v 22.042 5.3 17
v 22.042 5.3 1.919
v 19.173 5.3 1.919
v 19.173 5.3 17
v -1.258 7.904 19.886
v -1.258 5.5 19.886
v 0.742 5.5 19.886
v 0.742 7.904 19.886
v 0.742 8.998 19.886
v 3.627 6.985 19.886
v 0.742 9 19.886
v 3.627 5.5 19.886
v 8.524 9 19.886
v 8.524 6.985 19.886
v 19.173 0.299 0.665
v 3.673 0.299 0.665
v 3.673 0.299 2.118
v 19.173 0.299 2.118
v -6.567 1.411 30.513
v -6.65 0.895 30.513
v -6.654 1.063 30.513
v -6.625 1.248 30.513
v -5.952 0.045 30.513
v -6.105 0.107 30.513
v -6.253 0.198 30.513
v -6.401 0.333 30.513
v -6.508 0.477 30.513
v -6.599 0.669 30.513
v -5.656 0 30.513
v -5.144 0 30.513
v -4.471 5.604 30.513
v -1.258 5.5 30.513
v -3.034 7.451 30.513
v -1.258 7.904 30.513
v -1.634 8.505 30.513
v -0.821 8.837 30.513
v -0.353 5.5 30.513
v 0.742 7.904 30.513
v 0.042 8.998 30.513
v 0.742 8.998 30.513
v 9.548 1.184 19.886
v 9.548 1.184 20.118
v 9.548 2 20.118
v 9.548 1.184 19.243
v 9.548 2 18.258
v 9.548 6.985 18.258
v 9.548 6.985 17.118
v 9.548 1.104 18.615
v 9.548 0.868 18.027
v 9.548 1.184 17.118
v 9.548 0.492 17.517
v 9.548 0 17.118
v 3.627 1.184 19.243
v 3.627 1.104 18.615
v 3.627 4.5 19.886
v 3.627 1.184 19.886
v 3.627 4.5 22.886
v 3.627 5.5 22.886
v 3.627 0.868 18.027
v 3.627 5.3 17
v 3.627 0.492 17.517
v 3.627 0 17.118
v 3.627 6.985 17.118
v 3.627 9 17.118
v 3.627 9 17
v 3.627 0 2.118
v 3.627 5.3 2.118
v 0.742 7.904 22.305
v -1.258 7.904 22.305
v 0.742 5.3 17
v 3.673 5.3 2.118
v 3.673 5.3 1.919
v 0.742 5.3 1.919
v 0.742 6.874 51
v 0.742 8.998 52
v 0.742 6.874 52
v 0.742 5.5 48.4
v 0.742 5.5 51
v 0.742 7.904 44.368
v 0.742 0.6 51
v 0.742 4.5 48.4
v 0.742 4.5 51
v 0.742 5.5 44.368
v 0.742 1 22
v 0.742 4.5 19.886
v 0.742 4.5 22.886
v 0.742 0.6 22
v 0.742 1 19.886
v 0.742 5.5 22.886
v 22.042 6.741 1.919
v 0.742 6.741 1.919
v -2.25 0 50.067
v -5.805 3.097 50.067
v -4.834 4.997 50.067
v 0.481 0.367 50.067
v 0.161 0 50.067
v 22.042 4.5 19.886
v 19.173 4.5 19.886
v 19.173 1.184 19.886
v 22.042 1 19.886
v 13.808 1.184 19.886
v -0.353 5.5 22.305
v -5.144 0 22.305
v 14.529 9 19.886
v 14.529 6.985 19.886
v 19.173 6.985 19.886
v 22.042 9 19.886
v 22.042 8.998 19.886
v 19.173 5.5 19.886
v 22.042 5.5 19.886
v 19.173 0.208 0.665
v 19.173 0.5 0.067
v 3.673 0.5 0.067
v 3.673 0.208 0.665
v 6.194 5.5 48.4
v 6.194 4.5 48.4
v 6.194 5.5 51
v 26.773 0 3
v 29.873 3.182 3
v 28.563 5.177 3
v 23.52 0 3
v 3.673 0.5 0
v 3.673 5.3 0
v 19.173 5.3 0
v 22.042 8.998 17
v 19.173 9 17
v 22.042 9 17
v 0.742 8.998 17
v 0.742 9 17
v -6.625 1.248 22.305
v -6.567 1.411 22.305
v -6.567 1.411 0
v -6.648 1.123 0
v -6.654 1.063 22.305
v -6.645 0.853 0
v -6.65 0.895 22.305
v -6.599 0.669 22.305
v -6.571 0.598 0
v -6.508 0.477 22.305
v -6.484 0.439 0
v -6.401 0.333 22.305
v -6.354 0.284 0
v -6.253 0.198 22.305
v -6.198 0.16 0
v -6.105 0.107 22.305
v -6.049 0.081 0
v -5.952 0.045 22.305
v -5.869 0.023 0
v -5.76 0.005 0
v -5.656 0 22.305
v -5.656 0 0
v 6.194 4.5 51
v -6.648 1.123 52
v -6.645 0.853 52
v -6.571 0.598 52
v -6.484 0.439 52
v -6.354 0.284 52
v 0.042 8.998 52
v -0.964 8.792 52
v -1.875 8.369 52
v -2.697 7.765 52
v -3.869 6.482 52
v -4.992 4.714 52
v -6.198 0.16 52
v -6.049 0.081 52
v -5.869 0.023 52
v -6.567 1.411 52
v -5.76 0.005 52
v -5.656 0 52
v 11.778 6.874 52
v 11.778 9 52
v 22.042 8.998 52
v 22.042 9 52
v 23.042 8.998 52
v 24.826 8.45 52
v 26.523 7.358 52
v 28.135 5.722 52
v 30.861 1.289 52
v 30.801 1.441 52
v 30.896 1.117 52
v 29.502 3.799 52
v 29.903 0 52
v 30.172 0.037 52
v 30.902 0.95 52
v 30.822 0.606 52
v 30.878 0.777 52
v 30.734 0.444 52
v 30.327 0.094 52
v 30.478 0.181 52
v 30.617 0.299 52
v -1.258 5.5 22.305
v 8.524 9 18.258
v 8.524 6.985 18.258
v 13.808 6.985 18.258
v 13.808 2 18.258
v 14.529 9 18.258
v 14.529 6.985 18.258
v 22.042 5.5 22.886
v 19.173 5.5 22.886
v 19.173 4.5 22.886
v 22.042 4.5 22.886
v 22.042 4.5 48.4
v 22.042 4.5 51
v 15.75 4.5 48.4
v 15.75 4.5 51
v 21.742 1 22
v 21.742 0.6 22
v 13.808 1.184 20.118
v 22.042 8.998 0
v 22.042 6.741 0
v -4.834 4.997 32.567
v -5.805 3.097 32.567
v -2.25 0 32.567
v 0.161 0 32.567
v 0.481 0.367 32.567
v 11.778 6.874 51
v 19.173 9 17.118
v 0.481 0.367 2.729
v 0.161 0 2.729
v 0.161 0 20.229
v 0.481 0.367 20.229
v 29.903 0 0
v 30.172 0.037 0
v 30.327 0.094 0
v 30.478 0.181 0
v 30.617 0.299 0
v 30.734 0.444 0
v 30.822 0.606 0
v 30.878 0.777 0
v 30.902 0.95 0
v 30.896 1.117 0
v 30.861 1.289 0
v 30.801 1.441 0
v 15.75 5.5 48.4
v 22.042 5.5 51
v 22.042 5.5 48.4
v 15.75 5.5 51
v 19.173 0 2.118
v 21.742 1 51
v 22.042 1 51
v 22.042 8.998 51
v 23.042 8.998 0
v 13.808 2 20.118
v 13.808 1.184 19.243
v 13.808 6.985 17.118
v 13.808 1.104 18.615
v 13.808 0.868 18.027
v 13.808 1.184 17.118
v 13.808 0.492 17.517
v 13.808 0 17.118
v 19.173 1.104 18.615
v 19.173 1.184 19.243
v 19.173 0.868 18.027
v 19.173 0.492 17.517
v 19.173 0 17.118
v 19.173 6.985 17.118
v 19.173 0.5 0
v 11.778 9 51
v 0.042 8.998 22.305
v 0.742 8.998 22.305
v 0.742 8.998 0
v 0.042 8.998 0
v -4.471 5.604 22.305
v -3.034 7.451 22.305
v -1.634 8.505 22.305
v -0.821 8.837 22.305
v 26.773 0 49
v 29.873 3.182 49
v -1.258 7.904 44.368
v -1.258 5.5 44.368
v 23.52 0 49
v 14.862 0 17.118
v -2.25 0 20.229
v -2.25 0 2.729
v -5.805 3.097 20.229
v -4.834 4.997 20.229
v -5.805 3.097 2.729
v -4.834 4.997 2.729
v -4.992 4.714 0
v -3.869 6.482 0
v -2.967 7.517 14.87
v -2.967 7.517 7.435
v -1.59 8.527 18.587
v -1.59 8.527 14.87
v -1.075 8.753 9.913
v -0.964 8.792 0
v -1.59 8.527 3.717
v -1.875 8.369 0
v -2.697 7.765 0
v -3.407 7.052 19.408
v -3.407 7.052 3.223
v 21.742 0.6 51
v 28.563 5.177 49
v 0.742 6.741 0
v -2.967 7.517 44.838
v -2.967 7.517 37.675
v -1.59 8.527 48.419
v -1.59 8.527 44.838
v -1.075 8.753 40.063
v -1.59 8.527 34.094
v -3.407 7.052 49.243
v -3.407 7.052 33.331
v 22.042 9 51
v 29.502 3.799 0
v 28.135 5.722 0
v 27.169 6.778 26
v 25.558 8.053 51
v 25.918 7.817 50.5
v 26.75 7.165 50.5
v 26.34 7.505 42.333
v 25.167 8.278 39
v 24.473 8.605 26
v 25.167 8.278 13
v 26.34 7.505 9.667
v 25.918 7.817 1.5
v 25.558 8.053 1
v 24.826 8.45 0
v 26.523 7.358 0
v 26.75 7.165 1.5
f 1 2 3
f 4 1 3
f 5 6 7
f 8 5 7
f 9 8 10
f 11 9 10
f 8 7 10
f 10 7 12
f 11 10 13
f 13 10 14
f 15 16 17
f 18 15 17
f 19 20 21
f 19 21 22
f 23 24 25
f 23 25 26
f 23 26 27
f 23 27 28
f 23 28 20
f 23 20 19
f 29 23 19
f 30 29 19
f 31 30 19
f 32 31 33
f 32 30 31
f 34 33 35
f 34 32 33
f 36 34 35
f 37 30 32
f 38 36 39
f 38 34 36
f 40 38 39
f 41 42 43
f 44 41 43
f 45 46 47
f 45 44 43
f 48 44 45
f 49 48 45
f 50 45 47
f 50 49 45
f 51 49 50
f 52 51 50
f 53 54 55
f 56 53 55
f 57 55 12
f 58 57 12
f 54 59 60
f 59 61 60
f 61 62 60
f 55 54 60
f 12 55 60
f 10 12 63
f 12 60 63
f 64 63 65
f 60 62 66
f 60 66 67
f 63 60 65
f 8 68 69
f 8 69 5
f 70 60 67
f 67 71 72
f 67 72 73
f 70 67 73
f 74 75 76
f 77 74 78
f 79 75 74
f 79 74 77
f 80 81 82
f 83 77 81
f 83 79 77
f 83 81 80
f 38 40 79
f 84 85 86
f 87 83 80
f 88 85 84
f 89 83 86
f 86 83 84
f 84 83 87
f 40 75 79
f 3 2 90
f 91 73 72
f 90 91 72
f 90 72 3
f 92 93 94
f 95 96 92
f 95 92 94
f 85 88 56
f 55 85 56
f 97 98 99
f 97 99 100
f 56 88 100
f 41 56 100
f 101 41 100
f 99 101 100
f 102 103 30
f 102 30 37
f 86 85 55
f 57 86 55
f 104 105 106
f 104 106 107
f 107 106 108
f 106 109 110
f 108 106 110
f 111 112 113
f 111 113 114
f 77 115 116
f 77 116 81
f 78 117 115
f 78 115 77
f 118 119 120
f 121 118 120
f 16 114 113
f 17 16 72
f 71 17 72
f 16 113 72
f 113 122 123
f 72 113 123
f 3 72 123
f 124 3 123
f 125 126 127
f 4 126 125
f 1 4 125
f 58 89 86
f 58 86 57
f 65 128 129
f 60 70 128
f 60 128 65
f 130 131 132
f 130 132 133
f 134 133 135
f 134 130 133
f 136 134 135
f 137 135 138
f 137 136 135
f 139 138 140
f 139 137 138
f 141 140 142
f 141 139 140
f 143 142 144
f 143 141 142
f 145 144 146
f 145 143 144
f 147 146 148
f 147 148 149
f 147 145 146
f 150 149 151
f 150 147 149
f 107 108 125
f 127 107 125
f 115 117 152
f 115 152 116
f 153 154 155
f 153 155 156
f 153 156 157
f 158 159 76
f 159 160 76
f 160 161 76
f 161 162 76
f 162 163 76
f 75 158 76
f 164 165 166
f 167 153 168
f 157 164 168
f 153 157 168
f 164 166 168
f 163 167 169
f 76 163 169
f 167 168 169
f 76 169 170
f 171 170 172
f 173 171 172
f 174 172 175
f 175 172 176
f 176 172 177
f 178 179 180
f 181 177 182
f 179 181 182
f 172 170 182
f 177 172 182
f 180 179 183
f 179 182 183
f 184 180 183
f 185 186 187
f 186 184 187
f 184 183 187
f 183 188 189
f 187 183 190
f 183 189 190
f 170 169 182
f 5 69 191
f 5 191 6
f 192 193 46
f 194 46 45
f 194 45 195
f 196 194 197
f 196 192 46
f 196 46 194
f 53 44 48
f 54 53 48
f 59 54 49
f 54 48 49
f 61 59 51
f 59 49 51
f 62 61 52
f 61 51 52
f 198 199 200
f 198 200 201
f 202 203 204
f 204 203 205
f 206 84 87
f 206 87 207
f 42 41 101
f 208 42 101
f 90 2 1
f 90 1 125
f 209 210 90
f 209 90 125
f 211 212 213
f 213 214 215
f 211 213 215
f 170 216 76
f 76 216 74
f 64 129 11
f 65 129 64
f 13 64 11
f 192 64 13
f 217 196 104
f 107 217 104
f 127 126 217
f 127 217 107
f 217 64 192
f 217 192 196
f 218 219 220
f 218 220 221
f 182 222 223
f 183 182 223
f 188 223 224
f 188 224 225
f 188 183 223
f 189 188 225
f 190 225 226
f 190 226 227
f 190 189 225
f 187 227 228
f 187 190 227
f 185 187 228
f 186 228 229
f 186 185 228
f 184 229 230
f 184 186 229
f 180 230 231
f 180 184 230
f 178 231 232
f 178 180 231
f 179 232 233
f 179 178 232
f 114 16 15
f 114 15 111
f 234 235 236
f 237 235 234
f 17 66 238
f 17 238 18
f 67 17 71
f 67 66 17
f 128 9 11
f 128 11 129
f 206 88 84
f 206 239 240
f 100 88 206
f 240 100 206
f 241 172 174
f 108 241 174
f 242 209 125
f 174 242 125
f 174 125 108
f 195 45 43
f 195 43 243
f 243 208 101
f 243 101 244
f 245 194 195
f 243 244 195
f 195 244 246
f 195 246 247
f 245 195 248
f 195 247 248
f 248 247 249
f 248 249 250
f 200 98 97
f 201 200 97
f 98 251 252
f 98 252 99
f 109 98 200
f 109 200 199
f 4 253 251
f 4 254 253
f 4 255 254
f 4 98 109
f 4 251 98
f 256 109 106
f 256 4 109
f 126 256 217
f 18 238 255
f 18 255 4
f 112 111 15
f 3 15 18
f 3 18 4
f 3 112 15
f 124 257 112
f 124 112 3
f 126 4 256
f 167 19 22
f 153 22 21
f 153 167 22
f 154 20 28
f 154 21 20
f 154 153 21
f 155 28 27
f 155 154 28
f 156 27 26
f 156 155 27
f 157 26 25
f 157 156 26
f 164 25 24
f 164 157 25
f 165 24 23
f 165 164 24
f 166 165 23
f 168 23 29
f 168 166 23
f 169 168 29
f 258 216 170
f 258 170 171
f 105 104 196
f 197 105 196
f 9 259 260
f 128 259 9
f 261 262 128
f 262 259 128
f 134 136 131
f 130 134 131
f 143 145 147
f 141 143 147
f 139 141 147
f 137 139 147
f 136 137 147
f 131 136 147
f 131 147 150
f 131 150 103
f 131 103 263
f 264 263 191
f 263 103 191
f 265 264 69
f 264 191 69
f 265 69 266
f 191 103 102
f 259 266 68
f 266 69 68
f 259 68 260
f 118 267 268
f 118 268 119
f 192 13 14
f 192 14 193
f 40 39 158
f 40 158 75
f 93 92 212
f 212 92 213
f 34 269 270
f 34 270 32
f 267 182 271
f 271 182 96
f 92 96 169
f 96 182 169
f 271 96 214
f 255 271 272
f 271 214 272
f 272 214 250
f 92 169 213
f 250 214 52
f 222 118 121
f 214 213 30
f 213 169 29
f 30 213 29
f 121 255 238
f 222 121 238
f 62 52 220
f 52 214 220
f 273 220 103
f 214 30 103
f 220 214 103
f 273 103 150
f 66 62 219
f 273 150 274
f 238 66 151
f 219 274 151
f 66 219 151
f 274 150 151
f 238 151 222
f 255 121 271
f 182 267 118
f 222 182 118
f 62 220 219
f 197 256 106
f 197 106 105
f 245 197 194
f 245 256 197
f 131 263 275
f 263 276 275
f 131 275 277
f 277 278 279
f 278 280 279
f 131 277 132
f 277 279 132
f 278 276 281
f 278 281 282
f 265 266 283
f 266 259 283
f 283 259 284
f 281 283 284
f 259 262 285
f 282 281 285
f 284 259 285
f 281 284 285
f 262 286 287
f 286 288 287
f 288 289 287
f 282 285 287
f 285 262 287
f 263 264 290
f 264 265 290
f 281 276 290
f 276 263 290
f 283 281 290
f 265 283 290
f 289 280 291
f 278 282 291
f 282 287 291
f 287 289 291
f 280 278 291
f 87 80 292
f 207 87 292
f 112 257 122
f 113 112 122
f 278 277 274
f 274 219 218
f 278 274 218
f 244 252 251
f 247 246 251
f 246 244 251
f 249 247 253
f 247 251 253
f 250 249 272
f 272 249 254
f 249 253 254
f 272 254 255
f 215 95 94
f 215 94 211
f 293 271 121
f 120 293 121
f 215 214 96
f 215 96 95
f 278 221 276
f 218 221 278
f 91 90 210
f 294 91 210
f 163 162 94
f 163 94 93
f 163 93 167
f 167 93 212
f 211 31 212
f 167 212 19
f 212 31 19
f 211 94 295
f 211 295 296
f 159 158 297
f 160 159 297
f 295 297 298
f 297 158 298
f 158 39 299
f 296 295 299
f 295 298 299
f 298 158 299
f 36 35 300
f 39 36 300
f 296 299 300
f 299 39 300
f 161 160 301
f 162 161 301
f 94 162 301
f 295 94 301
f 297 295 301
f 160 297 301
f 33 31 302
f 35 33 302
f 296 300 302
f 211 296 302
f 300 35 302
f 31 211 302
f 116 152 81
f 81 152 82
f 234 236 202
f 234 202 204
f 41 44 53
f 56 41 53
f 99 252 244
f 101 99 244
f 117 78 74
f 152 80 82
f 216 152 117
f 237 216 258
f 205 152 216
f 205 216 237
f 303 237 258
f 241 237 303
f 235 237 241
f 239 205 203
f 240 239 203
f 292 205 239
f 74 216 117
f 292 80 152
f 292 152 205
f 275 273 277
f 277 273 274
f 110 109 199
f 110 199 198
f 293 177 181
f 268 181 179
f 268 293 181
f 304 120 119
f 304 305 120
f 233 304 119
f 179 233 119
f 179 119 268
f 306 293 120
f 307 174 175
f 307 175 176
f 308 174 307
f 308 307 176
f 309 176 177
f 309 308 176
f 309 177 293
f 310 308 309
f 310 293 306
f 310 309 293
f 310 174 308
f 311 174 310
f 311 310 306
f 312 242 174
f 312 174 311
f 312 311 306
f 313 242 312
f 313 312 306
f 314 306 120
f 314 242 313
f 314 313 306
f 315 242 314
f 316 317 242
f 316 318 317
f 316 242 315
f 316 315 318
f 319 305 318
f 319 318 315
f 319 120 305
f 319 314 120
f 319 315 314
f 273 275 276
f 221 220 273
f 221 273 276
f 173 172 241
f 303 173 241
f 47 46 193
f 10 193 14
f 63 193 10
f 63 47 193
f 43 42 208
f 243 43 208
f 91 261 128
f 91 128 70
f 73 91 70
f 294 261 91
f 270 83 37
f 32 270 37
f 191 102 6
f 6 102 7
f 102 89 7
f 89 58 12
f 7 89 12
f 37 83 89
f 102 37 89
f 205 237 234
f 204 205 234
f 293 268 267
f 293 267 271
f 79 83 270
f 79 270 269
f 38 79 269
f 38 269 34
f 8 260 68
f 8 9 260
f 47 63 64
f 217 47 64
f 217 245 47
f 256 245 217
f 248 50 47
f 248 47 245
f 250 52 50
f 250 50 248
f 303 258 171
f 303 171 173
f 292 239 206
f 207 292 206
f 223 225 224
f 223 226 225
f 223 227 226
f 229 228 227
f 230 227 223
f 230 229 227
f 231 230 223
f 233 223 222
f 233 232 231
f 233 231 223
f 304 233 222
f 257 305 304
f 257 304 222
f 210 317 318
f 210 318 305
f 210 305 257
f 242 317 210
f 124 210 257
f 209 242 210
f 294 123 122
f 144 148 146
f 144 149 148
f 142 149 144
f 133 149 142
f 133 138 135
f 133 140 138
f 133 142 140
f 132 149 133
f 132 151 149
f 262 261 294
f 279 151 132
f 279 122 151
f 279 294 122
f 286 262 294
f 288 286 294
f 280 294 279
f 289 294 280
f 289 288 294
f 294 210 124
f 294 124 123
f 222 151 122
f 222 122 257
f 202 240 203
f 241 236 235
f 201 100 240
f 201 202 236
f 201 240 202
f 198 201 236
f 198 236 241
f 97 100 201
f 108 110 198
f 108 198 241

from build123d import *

# Parameters (mm, degrees)
BOSS_EXTRUDE2_DEPTH      = 52
FILLET2_R                = 1
CUT_EXTRUDE2_DEPTH       = 3
CUT_EXTRUDE2_DEPTH_BACK  = 6
SKETCH10_W               = 2.071027546
SKETCH10_H               = 17.5
SKETCH12_W               = 21
SKETCH12_H               = 29
BATTERY_DEPTH            = 0.4
SKETCH14_W               = 21.3
SKETCH14_H               = 1
BOSS_EXTRUDE4_DEPTH      = 7.999920354
FILLET5_R                = 1
SKETCH19_W               = 21.3
SKETCH19_H               = 1
BOSS_EXTRUDE5_DEPTH      = 2.6
SKETCH20_W               = 9.556221564
SKETCH20_H               = 2.6
CUT_EXTRUDE9_DEPTH       = 2.6
SKETCH21_W               = 21.3
SKETCH21_H               = 2.886084762
BOSS_EXTRUDE6_DEPTH      = 8
SKETCH23_W               = 24.481547991
SKETCH23_H               = 2.403526745
CUT_EXTRUDE10_DEPTH      = 2
SKETCH26_W               = 11.036128308
SKETCH26_H               = 2.126226966
CUT_EXTRUDE11_DEPTH      = 2
CUT_EXTRUDE12_DEPTH      = 2
CUT_EXTRUDE12_DEPTH_BACK = 11
SKETCH27_W               = 46
SKETCH27_H               = 2.33
CUT_EXTRUDE15_DEPTH      = 3
CUT_EXTRUDE15_DEPTH_BACK = 2
SKETCH30_W               = 16.027497941
SKETCH30_H               = 8.207966742
SKETCH32_W               = 21.3
SKETCH32_H               = 4.3
BOSS_EXTRUDE7_DEPTH      = 17
SKETCH33_W               = 15.5
SKETCH33_H               = 4.8
CUT_EXTRUDE16_DEPTH      = 17
CUT_EXTRUDE17_DEPTH      = 16
CUT_EXTRUDE17_DEPTH_BACK = 16
SKETCH34_W               = 15.546115034
SKETCH34_H               = 15
CHAMFER1_SIZE            = 2.050303842
CHAMFER1_SIZE_2          = 1
SKETCH36_W               = 1.919218309
SKETCH36_H               = 1.441495618
BOSS_EXTRUDE8_DEPTH      = 24
SKETCH37_W               = 15.546115034
SKETCH37_H               = 5.800639797
CUT_EXTRUDE18_DEPTH      = 3
SKETCH38_W               = 4.259754253
SKETCH38_H               = 3
BOSS_EXTRUDE9_DEPTH      = 7
FILLET6_R                = 2.5
BOSS_EXTRUDE10_DEPTH     = 18
SKETCH41_W               = 2.868853839
SKETCH41_H               = 1
SKETCH41_W_2             = 2.885031127
BOSS_EXTRUDE11_DEPTH     = 3
SKETCH42_W               = 6.004877842
SKETCH42_H               = 3.067097043
CUT_EXTRUDE19_DEPTH      = 7


with BuildPart() as part:
    # Sketch1 → Boss-Extrude2 (new body)
    with BuildSketch(Plane.XY):
        with BuildLine():
            Line((-4.570161627, 0), (-7.263800128, 0))
            add(Edge.make_bspline(
                [(0.042333709, 8.998333002), (-4.213116867, 8.648828695), (-5.985828681, 2.169241543), (-7.263800128, 0)],
                knots=[0, 0, 0, 0, 1, 1, 1, 1], degree=3))
            Line((0.042333709, 8.998333002), (0.742333709, 8.998333002))
            Line((0.742333709, 8.998333002), (0.742333709, 1))
            Line((0.742333709, 1), (22.042333709, 1))
            Line((22.042333709, 1), (22.042333709, 8.998333002))
            Line((22.042333709, 8.998333002), (23.042333709, 8.998333002))
            add(Edge.make_bspline(
                [(23.042333709, 8.998333002), (27.852391375, 8.27132168), (31.467788923, 0)],
                knots=[0, 0, 0, 1, 1, 1], degree=2))
            Line((31.467788923, 0), (26.875523276, 0))
            Line((26.875523276, 0), (22.86911945, 0))
            Line((22.86911945, 0), (0, 0))
            Line((0, 0), (-4.570161627, 0))
        make_face()
    extrude(amount=BOSS_EXTRUDE2_DEPTH)

    # Fillet2
    fillet2_edges = [part.edges().sort_by_distance(p)[0] for p in [
        (-7.263800128, 0, 26),
    ]]
    fillet(fillet2_edges, radius=FILLET2_R)

    # Sketch10 → Cut-Extrude2 (cut, two sides: drawn at the far end of the back side and taken through both)
    with BuildSketch(Plane(origin=(-4.432649633, 3.861619691, 0), x_dir=(0.6568701979277837, 0.7540036757697632, 0), z_dir=(-0.7540036757697632, 0.6568701979277837, 0)).offset(-CUT_EXTRUDE2_DEPTH_BACK)):
        with Locations((-0.442686988, -41.317163409)):
            Rectangle(SKETCH10_W, SKETCH10_H)
        with Locations((-0.442686988, -11.478878468)):
            Rectangle(SKETCH10_W, SKETCH10_H)
    extrude(amount=CUT_EXTRUDE2_DEPTH + CUT_EXTRUDE2_DEPTH_BACK, mode=Mode.SUBTRACT)

    # Sketch12 → Battery (cut)
    with BuildSketch(Plane(origin=(0, 1, 0), x_dir=(1, 0, 0), z_dir=(0, 1, 0))):
        with Locations((11.242333709, -36.5)):
            Rectangle(SKETCH12_W, SKETCH12_H)
    extrude(amount=-BATTERY_DEPTH, mode=Mode.SUBTRACT)

    # Sketch14 → Boss-Extrude4 (add)
    with BuildSketch(Plane(origin=(0, 1, 0), x_dir=(1, 0, 0), z_dir=(0, 1, 0))):
        with Locations((11.392333709, -51.5)):
            Rectangle(SKETCH14_W, SKETCH14_H)
    extrude(amount=BOSS_EXTRUDE4_DEPTH)

    # Fillet5
    fillet5_edges = [part.edges().sort_by_distance(p)[0] for p in [
        (31.467788923, 0, 26),
    ]]
    fillet(fillet5_edges, radius=FILLET5_R)

    # Sketch19 → Boss-Extrude5 (add)
    with BuildSketch(Plane(origin=(0, 0, 51), x_dir=(-1, 0, 0), z_dir=(0, 0, -1))):
        with Locations((-11.392333709, 5)):
            Rectangle(SKETCH19_W, SKETCH19_H)
    extrude(amount=BOSS_EXTRUDE5_DEPTH)

    # Sketch20 → Cut-Extrude9 (cut)
    with BuildSketch(Plane(origin=(0, 5.5, 0), x_dir=(1, 0, 0), z_dir=(0, 1, 0))):
        with Locations((10.971722634, -49.7)):
            Rectangle(SKETCH20_W, SKETCH20_H)
    extrude(amount=-CUT_EXTRUDE9_DEPTH, mode=Mode.SUBTRACT)

    # Sketch21 → Boss-Extrude6 (add)
    with BuildSketch(Plane(origin=(0, 1, 0), x_dir=(1, 0, 0), z_dir=(0, 1, 0))):
        with Locations((11.392333709, -18.443042381)):
            Rectangle(SKETCH21_W, SKETCH21_H)
    extrude(amount=BOSS_EXTRUDE6_DEPTH)

    # Sketch23 → Cut-Extrude10 (cut)
    with BuildSketch(Plane(origin=(0.742333709, 0, 0), x_dir=(0, 0, -1), z_dir=(1, 0, 0))):
        with Locations((-32.126858758, 6.701763373)):
            Rectangle(SKETCH23_W, SKETCH23_H)
    extrude(amount=-CUT_EXTRUDE10_DEPTH, mode=Mode.SUBTRACT)

    # Sketch26 → Cut-Extrude11 (cut)
    with BuildSketch(Plane(origin=(0, 0, 51), x_dir=(-1, 0, 0), z_dir=(0, 0, -1))):
        with Locations((-6.260397863, 7.936806871)):
            Rectangle(SKETCH26_W, SKETCH26_H)
    extrude(amount=-CUT_EXTRUDE11_DEPTH, mode=Mode.SUBTRACT)

    # Sketch27 → Cut-Extrude12 (cut, two sides: drawn at the far end of the back side and taken through both)
    with BuildSketch(Plane(origin=(15.71645511, 16.134429341, 0), x_dir=(0, 0, -1), z_dir=(0.6977674498915984, 0.7163243580053493, 0)).offset(-CUT_EXTRUDE12_DEPTH_BACK)):
        with Locations((-26, -18.013212029)):
            Rectangle(SKETCH27_W, SKETCH27_H)
    extrude(amount=CUT_EXTRUDE12_DEPTH + CUT_EXTRUDE12_DEPTH_BACK, mode=Mode.SUBTRACT)

    # Sketch30 → Cut-Extrude15 (cut, two sides: drawn at the far end of the back side and taken through both)
    with BuildSketch(Plane(origin=(-4.432649633, 3.861619691, 0), x_dir=(0.6568701979277837, 0.7540036757697632, 0), z_dir=(-0.7540036757697632, 0.6568701979277837, 0)).offset(-CUT_EXTRUDE15_DEPTH_BACK)):
        with Locations((1.087669114, -26.408883952)):
            Rectangle(SKETCH30_W, SKETCH30_H)
    extrude(amount=CUT_EXTRUDE15_DEPTH + CUT_EXTRUDE15_DEPTH_BACK, mode=Mode.SUBTRACT)

    # Sketch32 → Boss-Extrude7 (add)
    with BuildSketch(Plane(origin=(0, 0, 0), x_dir=(-1, 0, 0), z_dir=(0, 0, -1))):
        with Locations((-11.392333709, 3.15)):
            Rectangle(SKETCH32_W, SKETCH32_H)
    extrude(amount=-BOSS_EXTRUDE7_DEPTH)

    # Sketch33 → Cut-Extrude16 (cut)
    with BuildSketch(Plane(origin=(0, 0, 0), x_dir=(-1, 0, 0), z_dir=(0, 0, -1))):
        with Locations((-11.42347987, 2.9)):
            Rectangle(SKETCH33_W, SKETCH33_H)
    extrude(amount=-CUT_EXTRUDE16_DEPTH, mode=Mode.SUBTRACT)

    # Sketch34 → Cut-Extrude17 (cut, two sides: drawn at the far end of the back side and taken through both)
    with BuildSketch(Plane(origin=(0, 0.5, 0), x_dir=(1, 0, 0), z_dir=(0, 1, 0)).offset(-CUT_EXTRUDE17_DEPTH_BACK)):
        with Locations((11.400422353, -9.617701537)):
            Rectangle(SKETCH34_W, SKETCH34_H)
    extrude(amount=CUT_EXTRUDE17_DEPTH + CUT_EXTRUDE17_DEPTH_BACK, mode=Mode.SUBTRACT)

    # Chamfer1
    # the kernel refuses this chamfer: 2.050303842, 1 mm, written as the material it takes off along each edge
    with BuildSketch(Plane(origin=(19.17347987, 0.5, 2.117701537), x_dir=(0, 0.016923890849829, -0.9998567807033681), z_dir=(-1, 0, 0))) as chamfer1_piece_1:
        Polygon((CHAMFER1_SIZE * 0.999856780498, CHAMFER1_SIZE * 0.0169238908464), (-CHAMFER1_SIZE_2 * 0.0169238908498, CHAMFER1_SIZE_2 * 0.999856780703), (0, 0), align=None)
    extrude(amount=15.5, mode=Mode.SUBTRACT)

    # Sketch36 → Boss-Extrude8 (add)
    with BuildSketch(Plane(origin=(0.742333709, 0, 0), x_dir=(0, 0, -1), z_dir=(1, 0, 0))):
        with Locations((-0.959609155, 6.020747809)):
            Rectangle(SKETCH36_W, SKETCH36_H)
    extrude(amount=BOSS_EXTRUDE8_DEPTH)

    # Sketch37 → Cut-Extrude18 (cut)
    with BuildSketch(Plane(origin=(0, 0, 17.117701537), x_dir=(-1, 0, 0), z_dir=(0, 0, -1))):
        with Locations((-11.400422353, 4.08463089)):
            Rectangle(SKETCH37_W, SKETCH37_H)
    extrude(amount=-CUT_EXTRUDE18_DEPTH, mode=Mode.SUBTRACT)

    # Sketch38 → Boss-Extrude9 (add)
    with BuildSketch(Plane(origin=(0, 1.184310992, 0), x_dir=(1, 0, 0), z_dir=(0, 1, 0))):
        with Locations((11.677903031, -18.617701537)):
            Rectangle(SKETCH38_W, SKETCH38_H)
    extrude(amount=BOSS_EXTRUDE9_DEPTH)

    # Fillet6
    # the kernel refuses this fillet: 2.5 mm, written as the material it takes off along each edge
    with BuildSketch(Plane(origin=(14.862488739, 1.184310992, 17.117701537), x_dir=(0, -1, 0), z_dir=(-1, 0, 0))) as fillet6_piece_1_section:
        with BuildLine():
            CenterArc((2.5, 2.125785134), FILLET6_R, 180, 58.245844015)
            Line((0, 2.125785134), (-0.05, 2.125785134))
            Line((-0.05, 2.125785134), (-0.05, 0))
            Line((-0.05, 0), (0, -0.05))
            ThreePointArc((0, -0.05), (0.592155496, -0.05), (1.157997212, -0.042515703))
            Line((1.157997212, -0.042515703), (1.184310992, 0))
        make_face()
    fillet6_piece_1 = extrude(amount=11.235123902, mode=Mode.PRIVATE)
    fillet6_piece_1 = split(fillet6_piece_1, bisect_by=Plane(origin=(13.807780157, 0.878026012, 17.652561739), z_dir=(1, 0, 0)), keep=Keep.TOP, mode=Mode.PRIVATE)
    add(fillet6_piece_1, mode=Mode.SUBTRACT)
    with BuildSketch(Plane(origin=(9.548025904, 1.184310992, 17.117701537), x_dir=(0, -1, 0), z_dir=(-1, 0, 0))) as fillet6_piece_2:
        with BuildLine():
            CenterArc((2.5, 2.125785134), FILLET6_R, 180, 58.245844015)
            Line((0, 2.125785134), (-0.05, 2.125785134))
            Line((-0.05, 2.125785134), (-0.05, 0))
            Line((-0.05, 0), (0, -0.05))
            ThreePointArc((0, -0.05), (0.592155496, -0.05), (1.157997212, -0.042515703))
            Line((1.157997212, -0.042515703), (1.184310992, 0))
        make_face()
    extrude(amount=5.920661068, mode=Mode.SUBTRACT)
    with BuildSketch(Plane(origin=(19.17347987, 1.184310992, 17.117701537), x_dir=(0, -1, 0), z_dir=(-1, 0, 0))) as fillet6_piece_3:
        with BuildLine():
            CenterArc((2.5, 2.125785134), FILLET6_R, 180, 58.245844015)
            Line((0, 2.125785134), (-0.05, 2.125785134))
            Line((-0.05, 2.125785134), (-0.05, 0))
            Line((-0.05, 0), (0, -0.05))
            ThreePointArc((0, -0.05), (0.592155496, -0.05), (1.157997212, -0.042515703))
            Line((1.157997212, -0.042515703), (1.184310992, 0))
        make_face()
    extrude(amount=5.365699713, mode=Mode.SUBTRACT)
    with BuildSketch(Plane(origin=(19.17347987, 1.184310992, 17.117701537), x_dir=(0, -1, 0), z_dir=(-1, 0, 0))) as fillet6_piece_4_section:
        with BuildLine():
            CenterArc((2.5, 2.125785134), FILLET6_R, 180, 58.245844015)
            Line((0, 2.125785134), (-0.05, 2.125785134))
            Line((-0.05, 2.125785134), (-0.05, 0))
            Line((-0.05, 0), (0, -0.05))
            ThreePointArc((0, -0.05), (0.592155496, -0.05), (1.157997212, -0.042515703))
            Line((1.157997212, -0.042515703), (1.184310992, 0))
        make_face()
    fillet6_piece_4 = extrude(amount=10.680162547, mode=Mode.PRIVATE)
    fillet6_piece_4 = split(fillet6_piece_4, bisect_by=Plane(origin=(9.548025904, 0.878026012, 17.652561739), z_dir=(-1, 0, 0)), keep=Keep.TOP, mode=Mode.PRIVATE)
    add(fillet6_piece_4, mode=Mode.SUBTRACT)

    # Sketch40 → Boss-Extrude10 (add)
    with BuildSketch(Plane(origin=(3.67347987, 0, 0), x_dir=(0, 0, -1), z_dir=(1, 0, 0))):
        Polygon((-1.194674299, 0), (-2.117701537, 0), (-2.117701537, 0.29858263), (-1.194674299, 0.29858263), (-0.66544558, 0.29858263), (-0.66544558, 0), align=None)
    extrude(amount=BOSS_EXTRUDE10_DEPTH)

    # Sketch41 → Boss-Extrude11 (add)
    with BuildSketch(Plane.XY.offset(19.886084762)):
        with Locations((20.607906789, 5)):
            Rectangle(SKETCH41_W, SKETCH41_H)
        with Locations((2.184849273, 5)):
            Rectangle(SKETCH41_W_2, SKETCH41_H)
    extrude(amount=BOSS_EXTRUDE11_DEPTH)

    # Sketch42 → Cut-Extrude19 (cut)
    with BuildSketch(Plane(origin=(0, 9, 0), x_dir=(1, 0, 0), z_dir=(0, 1, 0))):
        with Locations((11.52664117, -19.791450538)):
            Rectangle(SKETCH42_W, SKETCH42_H)
    extrude(amount=-CUT_EXTRUDE19_DEPTH, mode=Mode.SUBTRACT)


solid = part.part
